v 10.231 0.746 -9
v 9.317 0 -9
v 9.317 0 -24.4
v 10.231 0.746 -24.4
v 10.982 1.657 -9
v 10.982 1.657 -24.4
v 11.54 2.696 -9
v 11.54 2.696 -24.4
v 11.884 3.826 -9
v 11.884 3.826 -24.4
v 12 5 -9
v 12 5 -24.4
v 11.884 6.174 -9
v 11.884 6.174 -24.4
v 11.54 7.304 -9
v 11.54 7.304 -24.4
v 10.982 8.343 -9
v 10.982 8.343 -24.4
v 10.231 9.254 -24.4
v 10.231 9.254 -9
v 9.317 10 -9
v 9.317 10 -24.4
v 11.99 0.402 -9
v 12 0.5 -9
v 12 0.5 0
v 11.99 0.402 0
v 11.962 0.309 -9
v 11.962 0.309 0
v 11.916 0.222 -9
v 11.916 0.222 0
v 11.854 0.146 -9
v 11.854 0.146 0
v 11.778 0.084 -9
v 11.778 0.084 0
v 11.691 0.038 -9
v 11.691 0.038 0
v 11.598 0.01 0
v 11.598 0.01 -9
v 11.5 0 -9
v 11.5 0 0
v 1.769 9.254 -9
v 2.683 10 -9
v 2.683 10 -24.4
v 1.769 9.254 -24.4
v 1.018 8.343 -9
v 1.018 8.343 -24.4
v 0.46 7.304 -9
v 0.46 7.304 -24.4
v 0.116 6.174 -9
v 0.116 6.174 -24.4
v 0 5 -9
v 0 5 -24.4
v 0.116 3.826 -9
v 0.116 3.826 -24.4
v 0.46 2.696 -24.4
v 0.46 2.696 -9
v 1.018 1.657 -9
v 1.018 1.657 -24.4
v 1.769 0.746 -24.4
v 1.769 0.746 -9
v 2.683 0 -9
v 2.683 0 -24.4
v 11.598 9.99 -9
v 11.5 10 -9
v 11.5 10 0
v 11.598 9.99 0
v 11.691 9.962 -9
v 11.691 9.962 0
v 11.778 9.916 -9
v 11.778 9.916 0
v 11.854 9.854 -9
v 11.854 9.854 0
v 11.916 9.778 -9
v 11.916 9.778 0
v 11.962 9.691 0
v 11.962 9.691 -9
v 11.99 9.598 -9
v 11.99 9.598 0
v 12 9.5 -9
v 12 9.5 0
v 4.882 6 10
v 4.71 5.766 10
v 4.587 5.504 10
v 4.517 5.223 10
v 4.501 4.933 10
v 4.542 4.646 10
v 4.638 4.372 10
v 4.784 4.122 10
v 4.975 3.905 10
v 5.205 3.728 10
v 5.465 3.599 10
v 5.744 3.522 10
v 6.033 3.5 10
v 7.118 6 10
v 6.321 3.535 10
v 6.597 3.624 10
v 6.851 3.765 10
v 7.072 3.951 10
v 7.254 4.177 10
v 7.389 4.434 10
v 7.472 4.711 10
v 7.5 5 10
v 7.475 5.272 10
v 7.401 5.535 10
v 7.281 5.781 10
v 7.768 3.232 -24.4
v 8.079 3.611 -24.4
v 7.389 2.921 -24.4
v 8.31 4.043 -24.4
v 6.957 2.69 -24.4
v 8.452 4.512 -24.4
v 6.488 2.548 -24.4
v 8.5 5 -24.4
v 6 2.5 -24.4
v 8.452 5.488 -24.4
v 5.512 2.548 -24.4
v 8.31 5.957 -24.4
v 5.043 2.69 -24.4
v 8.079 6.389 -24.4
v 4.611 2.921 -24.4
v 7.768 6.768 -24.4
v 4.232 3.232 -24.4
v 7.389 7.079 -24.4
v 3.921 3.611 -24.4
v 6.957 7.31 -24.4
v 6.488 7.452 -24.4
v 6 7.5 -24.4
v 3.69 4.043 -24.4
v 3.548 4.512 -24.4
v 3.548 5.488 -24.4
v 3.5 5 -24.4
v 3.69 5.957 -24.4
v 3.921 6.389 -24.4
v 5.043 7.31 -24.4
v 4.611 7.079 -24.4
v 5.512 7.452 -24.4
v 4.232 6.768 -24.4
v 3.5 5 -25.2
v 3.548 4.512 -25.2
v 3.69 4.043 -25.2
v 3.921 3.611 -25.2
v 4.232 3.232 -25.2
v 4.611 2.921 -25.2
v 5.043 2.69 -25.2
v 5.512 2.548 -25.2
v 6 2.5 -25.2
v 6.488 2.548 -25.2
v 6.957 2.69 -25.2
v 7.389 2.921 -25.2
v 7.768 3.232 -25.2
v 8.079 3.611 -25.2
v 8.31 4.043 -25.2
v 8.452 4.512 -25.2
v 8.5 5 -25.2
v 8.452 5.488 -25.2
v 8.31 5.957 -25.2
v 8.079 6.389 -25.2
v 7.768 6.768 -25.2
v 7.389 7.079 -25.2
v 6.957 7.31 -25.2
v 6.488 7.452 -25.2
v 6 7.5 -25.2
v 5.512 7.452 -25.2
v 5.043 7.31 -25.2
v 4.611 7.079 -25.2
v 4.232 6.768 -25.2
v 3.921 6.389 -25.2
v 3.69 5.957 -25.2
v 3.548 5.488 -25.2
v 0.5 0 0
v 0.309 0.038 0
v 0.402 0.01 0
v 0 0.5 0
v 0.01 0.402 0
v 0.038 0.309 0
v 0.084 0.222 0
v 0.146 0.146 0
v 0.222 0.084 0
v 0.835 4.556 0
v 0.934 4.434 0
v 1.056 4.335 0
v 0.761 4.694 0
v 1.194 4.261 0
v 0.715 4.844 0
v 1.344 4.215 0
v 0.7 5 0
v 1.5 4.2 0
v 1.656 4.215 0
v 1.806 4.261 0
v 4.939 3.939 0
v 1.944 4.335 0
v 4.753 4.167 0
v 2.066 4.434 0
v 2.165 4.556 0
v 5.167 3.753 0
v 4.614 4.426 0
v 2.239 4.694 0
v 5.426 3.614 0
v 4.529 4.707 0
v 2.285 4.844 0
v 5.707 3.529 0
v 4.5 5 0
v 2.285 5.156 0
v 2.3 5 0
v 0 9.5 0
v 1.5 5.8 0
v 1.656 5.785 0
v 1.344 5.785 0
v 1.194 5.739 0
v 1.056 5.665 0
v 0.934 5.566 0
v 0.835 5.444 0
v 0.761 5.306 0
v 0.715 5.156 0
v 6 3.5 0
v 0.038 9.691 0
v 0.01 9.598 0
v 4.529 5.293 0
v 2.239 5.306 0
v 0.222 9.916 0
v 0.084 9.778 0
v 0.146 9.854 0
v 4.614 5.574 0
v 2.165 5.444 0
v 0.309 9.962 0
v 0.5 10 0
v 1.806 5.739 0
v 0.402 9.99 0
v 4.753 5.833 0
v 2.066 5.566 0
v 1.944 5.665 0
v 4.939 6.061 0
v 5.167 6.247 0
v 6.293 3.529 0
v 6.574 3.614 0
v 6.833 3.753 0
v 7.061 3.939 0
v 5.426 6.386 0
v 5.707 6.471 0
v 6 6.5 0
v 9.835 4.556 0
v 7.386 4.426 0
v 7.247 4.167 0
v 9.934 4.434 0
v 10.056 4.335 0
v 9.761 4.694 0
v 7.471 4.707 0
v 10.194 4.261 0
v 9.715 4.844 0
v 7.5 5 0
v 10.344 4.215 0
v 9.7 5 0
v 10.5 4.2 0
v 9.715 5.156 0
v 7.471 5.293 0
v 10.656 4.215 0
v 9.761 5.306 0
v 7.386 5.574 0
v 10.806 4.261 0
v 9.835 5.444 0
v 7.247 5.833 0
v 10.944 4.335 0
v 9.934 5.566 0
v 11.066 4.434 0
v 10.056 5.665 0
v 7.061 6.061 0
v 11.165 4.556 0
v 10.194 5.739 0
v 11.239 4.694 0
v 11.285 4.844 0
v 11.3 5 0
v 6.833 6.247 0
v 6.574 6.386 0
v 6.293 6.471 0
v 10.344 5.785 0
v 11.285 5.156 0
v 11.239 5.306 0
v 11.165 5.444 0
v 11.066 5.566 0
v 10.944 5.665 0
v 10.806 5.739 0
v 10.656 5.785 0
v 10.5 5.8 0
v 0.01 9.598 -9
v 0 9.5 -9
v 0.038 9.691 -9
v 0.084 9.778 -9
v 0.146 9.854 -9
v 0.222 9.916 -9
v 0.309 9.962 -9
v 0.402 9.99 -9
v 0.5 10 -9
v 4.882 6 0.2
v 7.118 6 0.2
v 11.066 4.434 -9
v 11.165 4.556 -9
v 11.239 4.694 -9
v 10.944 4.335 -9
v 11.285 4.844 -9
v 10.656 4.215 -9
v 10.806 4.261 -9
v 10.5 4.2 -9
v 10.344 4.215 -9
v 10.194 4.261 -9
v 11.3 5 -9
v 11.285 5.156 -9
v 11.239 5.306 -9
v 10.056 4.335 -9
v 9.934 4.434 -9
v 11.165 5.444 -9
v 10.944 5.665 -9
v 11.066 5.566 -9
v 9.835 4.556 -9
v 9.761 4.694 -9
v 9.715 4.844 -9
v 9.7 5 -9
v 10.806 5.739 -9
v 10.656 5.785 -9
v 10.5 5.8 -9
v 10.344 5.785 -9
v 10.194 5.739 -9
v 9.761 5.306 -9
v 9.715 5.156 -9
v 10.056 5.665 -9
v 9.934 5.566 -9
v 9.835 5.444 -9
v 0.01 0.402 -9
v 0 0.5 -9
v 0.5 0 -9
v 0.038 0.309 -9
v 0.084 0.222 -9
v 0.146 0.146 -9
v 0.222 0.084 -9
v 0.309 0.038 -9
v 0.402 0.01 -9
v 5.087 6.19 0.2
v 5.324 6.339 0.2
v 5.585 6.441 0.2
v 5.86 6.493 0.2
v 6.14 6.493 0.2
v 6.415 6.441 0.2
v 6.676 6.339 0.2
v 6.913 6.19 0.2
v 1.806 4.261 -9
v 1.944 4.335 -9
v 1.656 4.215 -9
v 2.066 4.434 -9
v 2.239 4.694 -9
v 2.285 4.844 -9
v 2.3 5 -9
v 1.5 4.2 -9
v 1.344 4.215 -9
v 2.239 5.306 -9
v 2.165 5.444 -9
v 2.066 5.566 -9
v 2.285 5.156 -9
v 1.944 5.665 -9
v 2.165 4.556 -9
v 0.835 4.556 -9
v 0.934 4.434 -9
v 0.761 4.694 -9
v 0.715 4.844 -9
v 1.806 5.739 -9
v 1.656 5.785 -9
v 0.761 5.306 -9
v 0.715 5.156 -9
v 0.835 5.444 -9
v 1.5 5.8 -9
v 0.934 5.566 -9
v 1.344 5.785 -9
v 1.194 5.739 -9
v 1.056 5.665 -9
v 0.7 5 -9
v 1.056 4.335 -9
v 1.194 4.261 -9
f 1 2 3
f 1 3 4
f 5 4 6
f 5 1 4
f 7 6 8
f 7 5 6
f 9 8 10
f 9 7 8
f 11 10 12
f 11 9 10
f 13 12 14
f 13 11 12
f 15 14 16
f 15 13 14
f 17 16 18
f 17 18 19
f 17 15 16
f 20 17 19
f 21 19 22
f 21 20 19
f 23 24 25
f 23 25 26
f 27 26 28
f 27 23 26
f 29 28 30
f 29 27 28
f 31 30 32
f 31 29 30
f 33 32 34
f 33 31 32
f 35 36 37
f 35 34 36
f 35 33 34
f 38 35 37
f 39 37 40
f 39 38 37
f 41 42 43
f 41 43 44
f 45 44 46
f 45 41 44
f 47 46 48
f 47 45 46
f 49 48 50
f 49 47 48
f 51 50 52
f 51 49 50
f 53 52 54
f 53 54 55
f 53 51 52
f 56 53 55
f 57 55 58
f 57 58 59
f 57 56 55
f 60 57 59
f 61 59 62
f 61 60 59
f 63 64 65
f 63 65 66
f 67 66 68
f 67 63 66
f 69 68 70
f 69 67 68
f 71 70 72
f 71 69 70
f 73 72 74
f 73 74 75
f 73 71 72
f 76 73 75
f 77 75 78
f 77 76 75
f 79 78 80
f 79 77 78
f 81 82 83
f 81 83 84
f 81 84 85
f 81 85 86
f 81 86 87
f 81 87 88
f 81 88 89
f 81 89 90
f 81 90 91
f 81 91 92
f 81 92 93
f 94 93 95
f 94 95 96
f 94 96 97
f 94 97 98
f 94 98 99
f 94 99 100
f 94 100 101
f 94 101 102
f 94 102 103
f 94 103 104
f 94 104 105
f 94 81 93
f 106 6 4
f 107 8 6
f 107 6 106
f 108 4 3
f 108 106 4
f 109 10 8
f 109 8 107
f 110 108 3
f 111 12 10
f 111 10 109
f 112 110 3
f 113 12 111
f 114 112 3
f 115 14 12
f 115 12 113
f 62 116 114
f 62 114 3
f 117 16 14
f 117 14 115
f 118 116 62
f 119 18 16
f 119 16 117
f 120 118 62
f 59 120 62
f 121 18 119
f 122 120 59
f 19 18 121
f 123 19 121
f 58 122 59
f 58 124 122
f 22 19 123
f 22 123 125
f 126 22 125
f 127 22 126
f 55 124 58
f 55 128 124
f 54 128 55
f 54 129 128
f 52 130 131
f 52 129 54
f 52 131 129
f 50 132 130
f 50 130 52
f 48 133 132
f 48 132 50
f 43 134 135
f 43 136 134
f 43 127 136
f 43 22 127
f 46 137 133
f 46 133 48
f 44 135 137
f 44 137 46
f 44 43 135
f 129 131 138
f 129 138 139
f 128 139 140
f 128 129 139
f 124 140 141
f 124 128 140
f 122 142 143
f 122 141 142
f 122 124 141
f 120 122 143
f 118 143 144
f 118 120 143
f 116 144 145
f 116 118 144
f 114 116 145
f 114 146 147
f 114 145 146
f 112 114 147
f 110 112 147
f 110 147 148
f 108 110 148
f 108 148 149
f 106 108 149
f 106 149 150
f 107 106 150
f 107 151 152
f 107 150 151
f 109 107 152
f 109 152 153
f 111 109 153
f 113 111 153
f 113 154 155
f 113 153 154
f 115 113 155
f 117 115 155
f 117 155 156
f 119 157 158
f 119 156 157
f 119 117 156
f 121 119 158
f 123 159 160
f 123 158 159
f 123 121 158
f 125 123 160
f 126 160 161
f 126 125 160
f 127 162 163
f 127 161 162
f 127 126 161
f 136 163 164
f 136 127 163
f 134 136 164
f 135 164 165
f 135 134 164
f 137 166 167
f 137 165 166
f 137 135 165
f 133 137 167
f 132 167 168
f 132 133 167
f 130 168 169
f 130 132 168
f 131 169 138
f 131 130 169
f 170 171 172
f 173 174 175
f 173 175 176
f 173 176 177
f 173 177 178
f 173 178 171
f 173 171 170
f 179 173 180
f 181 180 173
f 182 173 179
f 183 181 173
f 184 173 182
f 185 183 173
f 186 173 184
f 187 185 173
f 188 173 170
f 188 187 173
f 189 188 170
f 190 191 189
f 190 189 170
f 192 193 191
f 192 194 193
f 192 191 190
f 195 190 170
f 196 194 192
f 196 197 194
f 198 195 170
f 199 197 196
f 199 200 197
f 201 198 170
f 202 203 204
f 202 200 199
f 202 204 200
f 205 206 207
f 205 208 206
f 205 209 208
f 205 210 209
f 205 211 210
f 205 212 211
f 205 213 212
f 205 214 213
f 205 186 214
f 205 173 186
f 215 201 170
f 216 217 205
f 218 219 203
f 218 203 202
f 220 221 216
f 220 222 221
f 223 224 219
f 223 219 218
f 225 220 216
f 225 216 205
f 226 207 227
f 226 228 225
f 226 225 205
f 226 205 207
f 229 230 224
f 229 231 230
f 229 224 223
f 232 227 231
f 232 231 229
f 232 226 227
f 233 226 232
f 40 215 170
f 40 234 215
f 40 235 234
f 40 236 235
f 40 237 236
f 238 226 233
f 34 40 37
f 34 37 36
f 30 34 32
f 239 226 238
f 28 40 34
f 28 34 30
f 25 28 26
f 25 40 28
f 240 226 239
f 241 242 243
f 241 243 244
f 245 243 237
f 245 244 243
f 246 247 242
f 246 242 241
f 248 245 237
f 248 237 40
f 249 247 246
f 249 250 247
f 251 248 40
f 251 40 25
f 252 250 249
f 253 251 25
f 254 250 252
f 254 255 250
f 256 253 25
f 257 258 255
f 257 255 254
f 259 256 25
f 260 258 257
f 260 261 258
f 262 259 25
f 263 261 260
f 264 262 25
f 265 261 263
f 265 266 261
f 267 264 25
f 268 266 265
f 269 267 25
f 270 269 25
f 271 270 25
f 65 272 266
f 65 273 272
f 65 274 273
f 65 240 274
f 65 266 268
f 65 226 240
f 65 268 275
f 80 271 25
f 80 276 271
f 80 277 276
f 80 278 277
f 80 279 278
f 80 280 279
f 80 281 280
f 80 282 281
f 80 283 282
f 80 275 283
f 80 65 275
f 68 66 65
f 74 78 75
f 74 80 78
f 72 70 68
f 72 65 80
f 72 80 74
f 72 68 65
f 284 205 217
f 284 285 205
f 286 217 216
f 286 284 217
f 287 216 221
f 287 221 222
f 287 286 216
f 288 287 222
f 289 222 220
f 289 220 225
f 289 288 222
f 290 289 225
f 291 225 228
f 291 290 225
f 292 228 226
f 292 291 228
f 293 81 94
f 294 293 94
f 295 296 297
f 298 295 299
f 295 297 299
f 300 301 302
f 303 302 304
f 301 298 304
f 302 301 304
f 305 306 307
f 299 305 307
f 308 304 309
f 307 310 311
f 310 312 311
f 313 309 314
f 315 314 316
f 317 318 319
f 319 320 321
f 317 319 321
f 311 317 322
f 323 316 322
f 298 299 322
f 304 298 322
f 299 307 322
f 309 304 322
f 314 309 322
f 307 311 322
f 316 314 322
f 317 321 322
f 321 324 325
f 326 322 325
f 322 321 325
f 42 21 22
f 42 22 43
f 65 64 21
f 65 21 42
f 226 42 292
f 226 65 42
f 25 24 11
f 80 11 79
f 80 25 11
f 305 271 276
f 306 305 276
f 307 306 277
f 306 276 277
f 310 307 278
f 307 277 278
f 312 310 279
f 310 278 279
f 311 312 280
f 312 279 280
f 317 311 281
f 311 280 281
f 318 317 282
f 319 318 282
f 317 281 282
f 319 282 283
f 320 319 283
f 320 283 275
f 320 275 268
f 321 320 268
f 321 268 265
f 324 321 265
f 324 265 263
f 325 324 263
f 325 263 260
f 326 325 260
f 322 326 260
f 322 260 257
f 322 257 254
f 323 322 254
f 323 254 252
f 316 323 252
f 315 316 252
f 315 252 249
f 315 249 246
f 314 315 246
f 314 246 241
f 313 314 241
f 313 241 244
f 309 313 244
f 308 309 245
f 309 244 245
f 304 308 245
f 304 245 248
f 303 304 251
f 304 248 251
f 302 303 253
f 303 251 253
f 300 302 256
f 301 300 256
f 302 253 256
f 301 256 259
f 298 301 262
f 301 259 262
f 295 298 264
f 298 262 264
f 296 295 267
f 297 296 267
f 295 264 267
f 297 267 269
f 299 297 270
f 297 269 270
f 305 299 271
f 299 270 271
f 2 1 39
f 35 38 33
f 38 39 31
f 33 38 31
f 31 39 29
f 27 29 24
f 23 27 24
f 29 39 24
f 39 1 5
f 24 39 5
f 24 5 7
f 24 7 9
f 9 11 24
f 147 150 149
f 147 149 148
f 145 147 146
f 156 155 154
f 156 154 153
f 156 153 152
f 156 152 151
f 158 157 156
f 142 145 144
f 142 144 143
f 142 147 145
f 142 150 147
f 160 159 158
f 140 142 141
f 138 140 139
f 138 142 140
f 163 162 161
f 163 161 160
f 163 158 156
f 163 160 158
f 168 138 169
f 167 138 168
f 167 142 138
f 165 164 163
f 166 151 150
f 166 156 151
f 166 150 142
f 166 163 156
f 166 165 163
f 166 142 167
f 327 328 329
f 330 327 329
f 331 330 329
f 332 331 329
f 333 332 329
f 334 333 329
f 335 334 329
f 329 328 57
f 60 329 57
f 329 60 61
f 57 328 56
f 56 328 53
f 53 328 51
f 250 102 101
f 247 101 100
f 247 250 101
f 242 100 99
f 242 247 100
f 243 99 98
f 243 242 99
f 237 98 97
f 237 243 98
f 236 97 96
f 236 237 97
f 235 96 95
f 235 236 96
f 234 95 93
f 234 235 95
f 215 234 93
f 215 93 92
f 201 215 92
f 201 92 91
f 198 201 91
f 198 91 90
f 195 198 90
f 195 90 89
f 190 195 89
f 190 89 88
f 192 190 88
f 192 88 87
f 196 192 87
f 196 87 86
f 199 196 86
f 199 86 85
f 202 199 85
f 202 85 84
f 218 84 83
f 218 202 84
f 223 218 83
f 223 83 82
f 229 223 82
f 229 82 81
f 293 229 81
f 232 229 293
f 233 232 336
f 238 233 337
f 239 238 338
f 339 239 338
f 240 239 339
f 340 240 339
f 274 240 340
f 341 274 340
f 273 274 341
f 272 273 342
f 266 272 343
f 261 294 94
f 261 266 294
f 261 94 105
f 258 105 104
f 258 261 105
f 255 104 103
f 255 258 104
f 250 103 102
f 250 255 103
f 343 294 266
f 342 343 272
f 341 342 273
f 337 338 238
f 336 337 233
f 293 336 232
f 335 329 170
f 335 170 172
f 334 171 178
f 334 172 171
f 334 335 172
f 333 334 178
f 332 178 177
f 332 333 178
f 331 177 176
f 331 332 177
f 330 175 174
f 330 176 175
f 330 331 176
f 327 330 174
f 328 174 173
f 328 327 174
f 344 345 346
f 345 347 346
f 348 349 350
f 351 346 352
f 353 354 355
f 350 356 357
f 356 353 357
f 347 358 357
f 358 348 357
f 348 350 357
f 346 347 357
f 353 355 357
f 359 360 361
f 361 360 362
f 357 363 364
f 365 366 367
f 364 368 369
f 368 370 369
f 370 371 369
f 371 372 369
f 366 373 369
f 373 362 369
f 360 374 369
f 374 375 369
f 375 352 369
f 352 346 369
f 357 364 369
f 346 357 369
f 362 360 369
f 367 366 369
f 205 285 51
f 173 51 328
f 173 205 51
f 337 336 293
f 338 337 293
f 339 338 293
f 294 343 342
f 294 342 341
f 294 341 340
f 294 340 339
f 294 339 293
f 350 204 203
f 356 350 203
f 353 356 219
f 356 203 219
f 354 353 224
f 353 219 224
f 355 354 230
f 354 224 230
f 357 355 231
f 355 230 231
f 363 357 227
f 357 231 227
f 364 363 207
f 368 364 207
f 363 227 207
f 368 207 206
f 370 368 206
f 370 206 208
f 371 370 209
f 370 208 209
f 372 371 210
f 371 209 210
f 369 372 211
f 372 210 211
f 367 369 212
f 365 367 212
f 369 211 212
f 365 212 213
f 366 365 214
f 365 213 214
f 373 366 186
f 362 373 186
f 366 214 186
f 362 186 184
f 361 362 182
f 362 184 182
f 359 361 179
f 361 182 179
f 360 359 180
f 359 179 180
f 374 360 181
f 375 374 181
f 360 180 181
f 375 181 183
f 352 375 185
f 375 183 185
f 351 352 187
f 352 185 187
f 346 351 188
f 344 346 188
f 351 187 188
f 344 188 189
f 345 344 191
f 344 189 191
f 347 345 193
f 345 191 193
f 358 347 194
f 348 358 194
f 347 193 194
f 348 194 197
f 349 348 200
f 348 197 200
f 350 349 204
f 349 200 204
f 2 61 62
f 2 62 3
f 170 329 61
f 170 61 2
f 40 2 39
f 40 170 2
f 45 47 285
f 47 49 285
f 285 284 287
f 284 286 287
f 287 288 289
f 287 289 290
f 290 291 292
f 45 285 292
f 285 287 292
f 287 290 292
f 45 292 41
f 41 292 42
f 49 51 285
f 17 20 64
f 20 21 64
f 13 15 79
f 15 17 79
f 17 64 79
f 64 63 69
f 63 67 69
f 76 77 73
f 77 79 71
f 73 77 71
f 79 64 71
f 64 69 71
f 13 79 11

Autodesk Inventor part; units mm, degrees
ref_plane "YZ Plane" through (0, 0, 0) normal (1, 0, 0) x (0, 1, 0)
ref_plane "XZ Plane" through (0, 0, 0) normal (0, 1, 0) x (-1, 0, 0)
ref_plane "XY Plane" through (0, 0, 0) normal (0, 0, 1) x (1, 0, 0)
sketch "Sketch1" plane through (0, 0, 0) normal (0, 0, 1) x (1, 0, 0)
  line L0 (0, 0) -> (12, 0)
  line L1 (12, 0) -> (12, 10)
  line L2 (12, 10) -> (0, 10)
  line L3 (0, 10) -> (0, 0)
  line L4 (6, 10) -> (6, 0) construction
  line L5 (1.5, 5) -> (10.5, 5) construction
  circle A0 centre (1.5, 5) radius 0.8
  circle A1 centre (10.5, 5) radius 0.8
  circle A2 centre (6, 5) radius 1.5
  dimension "d0" = 10
  dimension "d1" = 12
  dimension "d2" = 9
  dimension "d3" = 1.6
  dimension "d4" = 3
extrude "Extrusion1" add sketch "Sketch1" against normal blind 9 contours L3 L2 L1 L0 | A0 | A1 | A2
extrude "Extrusion2" cut sketch "Sketch1" against normal through all contours A0 | A1
extrude "Extrusion3" add sketch "Sketch1" along normal blind 10 contours A2
sketch "Sketch2" plane through (6, 5, 10) normal (0, 0, 1) x (1, 0, 0)
  circle A0 centre (0, 0) radius 1.5 projected
  circle A1 centre (0, 0) radius 1.5 projected
  line L0 (-1.118, 1) -> (1.118, 1)
  point P0 (-6, -5)
  point P1 (-1.118, 1)
  point P2 (1.118, 1)
  dimension "d11" = 1
extrude "Extrusion4" cut sketch "Sketch2" against normal blind 9.8 contours L0 A0 picked at (-0.0599, 1.1631)
sketch "Sketch3" plane through (0, 0, -9) normal (0, 0, -1) x (-1, 0, 0)
  circle A0 centre (-6, 5) radius 1.5 projected
  circle A1 centre (-6, 5) radius 6
  circle A2 centre (-10.5, 5) radius 0.8 projected
  circle A3 centre (-1.5, 5) radius 0.8 projected
  line L0 (-12, 0) -> (0, 0) projected
  line L1 (0, 0) -> (0, 10) projected
  line L2 (0, 10) -> (-12, 10) projected
  line L3 (-12, 10) -> (-12, 0) projected
  point P0 (-2.6834, 10)
  point P1 (-9.3166, 10)
  point P2 (-9.3166, 0)
  point P3 (-2.6834, 0)
extrude "Extrusion5" add sketch "Sketch3" along normal blind 15.4 contours A0 | A1 L0 L2 | A2 | A3
sketch "Sketch4" plane through (0, 0, -24.4) normal (0, 0, -1) x (-1, 0, 0)
  arc A0 (-2.6834, 0) -> (-2.6834, 10) centre (-6, 5) ccw projected
  circle A1 centre (-6, 5) radius 2.5
  point P0 (0, 0)
  dimension "d16" = 5
extrude "Extrusion6" add sketch "Sketch4" along normal blind 0.8
fillet "Fillet1" radius 0.5 4 edges at (12, 10, -4.5) (0, 10, -4.5) (12, 0, -4.5) (0, 0, -4.5)
properties part number "n20"
